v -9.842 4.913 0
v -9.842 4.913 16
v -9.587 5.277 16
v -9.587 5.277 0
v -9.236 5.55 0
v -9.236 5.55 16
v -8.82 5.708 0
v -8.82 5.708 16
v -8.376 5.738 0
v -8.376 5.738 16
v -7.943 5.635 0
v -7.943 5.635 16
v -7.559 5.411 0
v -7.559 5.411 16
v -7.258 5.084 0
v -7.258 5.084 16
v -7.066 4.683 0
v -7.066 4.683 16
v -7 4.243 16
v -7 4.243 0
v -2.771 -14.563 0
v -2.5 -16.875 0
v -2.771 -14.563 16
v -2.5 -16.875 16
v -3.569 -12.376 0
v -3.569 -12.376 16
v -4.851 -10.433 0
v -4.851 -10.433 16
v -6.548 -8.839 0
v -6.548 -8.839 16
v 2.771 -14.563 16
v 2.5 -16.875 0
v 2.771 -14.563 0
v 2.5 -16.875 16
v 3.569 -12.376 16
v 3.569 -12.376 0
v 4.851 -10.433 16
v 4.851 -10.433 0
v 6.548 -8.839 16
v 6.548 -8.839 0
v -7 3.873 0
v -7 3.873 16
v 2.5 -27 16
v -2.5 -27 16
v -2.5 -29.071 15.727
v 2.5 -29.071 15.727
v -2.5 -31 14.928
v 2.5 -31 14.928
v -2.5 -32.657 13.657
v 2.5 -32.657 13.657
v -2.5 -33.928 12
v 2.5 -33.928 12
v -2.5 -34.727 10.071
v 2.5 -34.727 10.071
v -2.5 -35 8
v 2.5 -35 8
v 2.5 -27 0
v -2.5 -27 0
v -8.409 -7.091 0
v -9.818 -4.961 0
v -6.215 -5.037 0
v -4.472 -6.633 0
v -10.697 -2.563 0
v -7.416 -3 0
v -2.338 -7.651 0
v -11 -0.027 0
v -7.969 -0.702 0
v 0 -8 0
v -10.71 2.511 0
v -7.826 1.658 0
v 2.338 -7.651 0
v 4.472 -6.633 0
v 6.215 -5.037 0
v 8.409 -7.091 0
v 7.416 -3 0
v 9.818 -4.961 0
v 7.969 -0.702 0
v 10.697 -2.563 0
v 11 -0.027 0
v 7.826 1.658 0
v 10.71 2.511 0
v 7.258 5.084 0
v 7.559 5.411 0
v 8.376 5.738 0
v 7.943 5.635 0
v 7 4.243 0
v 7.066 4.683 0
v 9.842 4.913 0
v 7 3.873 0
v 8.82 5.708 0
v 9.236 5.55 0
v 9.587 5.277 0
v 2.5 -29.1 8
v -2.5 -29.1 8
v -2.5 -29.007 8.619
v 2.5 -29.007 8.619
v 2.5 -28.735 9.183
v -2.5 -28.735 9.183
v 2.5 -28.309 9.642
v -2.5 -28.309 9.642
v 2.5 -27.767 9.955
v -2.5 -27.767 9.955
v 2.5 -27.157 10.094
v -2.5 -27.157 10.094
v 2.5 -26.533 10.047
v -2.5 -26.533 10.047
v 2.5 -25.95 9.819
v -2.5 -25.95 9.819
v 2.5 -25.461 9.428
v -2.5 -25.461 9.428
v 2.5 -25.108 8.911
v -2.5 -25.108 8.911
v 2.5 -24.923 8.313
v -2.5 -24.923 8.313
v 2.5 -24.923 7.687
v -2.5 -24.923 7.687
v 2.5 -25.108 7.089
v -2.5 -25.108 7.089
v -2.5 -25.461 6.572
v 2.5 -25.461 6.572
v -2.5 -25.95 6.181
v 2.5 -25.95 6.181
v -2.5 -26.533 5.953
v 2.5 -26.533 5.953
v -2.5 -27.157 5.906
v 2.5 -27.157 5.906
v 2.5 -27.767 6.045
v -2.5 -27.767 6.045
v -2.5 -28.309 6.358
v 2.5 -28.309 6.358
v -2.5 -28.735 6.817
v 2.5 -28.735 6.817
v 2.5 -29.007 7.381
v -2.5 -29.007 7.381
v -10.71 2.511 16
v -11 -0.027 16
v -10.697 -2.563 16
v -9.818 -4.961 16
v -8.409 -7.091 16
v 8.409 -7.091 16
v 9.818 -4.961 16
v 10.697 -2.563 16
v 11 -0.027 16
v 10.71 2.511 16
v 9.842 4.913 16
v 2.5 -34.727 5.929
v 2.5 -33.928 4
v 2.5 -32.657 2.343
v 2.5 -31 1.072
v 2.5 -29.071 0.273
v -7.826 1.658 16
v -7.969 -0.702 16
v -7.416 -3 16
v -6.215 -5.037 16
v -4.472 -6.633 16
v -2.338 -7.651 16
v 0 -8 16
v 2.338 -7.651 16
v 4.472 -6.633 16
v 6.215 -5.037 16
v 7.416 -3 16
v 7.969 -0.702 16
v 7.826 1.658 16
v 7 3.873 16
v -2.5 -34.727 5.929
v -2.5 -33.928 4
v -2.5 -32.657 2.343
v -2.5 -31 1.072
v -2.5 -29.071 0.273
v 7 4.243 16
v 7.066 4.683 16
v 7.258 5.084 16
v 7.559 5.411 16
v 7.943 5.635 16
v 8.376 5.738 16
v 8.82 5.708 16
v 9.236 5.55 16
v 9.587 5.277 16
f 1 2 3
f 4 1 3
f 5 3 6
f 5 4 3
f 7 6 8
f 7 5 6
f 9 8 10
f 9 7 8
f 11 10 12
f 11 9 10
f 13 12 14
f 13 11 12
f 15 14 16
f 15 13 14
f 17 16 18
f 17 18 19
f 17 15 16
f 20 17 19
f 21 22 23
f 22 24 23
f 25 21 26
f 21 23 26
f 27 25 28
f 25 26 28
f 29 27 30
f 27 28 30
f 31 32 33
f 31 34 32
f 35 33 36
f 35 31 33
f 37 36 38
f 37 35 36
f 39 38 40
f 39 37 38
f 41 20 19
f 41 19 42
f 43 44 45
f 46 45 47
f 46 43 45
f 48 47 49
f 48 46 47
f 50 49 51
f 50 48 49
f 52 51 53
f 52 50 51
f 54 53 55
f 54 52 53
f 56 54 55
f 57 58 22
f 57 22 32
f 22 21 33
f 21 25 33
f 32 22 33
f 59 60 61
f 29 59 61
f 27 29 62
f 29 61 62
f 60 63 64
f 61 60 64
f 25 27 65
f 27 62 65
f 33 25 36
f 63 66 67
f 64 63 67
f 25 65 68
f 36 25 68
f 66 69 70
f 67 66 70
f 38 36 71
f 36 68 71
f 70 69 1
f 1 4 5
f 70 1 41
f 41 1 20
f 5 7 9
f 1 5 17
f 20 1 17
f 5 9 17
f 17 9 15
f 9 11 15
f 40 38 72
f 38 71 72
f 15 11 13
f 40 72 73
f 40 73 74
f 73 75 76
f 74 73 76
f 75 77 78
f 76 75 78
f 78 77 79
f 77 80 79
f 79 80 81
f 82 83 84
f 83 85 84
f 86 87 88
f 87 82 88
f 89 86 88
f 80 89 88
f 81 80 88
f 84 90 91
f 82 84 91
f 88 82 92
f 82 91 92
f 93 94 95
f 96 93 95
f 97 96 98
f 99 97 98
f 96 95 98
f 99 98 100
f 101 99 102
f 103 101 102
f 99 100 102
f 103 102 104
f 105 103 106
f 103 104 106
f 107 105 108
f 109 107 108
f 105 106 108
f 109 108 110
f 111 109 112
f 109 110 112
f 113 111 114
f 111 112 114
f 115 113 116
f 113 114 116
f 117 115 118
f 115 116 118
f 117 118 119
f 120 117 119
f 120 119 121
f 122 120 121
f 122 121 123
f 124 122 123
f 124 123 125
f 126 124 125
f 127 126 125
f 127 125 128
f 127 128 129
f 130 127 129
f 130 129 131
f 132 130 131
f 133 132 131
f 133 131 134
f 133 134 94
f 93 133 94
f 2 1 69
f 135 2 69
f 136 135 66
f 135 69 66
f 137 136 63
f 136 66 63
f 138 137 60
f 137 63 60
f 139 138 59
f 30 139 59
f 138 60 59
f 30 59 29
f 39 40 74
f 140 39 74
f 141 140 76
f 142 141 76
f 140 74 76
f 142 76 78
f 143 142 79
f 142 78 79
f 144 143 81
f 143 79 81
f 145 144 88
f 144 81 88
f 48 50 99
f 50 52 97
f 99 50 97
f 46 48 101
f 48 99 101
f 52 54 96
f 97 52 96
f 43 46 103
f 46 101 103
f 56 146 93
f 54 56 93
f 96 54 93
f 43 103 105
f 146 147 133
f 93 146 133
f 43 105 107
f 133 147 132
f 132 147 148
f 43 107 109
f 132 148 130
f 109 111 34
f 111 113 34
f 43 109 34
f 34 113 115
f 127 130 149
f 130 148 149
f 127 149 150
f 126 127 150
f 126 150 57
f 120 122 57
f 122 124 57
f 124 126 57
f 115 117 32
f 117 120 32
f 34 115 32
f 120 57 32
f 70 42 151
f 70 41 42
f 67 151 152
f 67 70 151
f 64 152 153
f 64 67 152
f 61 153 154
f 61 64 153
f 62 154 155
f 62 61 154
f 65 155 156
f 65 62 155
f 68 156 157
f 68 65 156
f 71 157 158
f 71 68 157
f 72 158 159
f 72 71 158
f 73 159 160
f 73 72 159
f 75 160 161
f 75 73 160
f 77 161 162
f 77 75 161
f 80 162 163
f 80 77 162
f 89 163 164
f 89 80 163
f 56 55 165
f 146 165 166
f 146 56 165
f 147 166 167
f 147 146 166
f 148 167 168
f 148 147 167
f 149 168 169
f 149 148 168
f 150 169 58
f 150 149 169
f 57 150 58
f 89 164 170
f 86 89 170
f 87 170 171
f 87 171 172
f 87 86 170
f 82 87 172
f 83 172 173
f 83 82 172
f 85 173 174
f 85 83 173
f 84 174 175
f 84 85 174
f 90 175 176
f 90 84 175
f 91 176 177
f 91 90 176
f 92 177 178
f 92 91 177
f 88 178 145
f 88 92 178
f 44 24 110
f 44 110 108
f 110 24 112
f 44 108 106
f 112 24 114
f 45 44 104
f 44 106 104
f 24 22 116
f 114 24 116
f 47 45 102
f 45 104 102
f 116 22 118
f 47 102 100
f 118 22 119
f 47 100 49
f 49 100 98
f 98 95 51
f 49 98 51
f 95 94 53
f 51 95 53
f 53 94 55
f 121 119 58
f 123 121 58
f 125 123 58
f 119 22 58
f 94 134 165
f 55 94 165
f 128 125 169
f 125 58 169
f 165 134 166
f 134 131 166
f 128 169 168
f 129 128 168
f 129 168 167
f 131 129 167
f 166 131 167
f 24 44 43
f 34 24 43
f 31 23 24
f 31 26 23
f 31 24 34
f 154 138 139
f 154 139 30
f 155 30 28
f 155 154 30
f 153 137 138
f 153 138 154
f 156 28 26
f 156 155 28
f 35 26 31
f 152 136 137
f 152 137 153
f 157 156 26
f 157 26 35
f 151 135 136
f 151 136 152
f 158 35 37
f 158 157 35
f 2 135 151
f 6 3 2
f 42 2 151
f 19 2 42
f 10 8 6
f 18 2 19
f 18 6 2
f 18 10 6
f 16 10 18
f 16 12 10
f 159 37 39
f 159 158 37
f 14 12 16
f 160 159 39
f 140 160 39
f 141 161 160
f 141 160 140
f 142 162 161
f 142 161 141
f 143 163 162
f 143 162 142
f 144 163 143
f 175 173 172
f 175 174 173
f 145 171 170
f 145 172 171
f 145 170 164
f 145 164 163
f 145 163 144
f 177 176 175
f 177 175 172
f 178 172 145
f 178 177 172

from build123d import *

# Parameters (mm, degrees)
F0_R     = 8
F1_DEPTH = 16
F3_DEPTH = 25
F4_R     = 1.5
F5_R     = 7.99999
F6_R     = 10
F7_R     = 2.1
F8_DEPTH = 25


# Not quite as in the source:
# - a fillet or chamfer is up to 0.001 mm smaller than in the source, because OpenCascade refuses the exact size


with BuildPart() as f1:
    # F0 (on Top) → F1 (new body)
    with BuildSketch(Plane.XY):
        with BuildLine():
            Line((2.5, -35), (2.5, -10.7121426428))
            ThreePointArc((2.5, -10.7121426428), (0, 11), (-2.5, -10.7121426428))
            Line((-2.5, -10.7121426428), (-2.5, -35))
            Line((-2.5, -35), (2.5, -35))
        make_face()
        Circle(F0_R, mode=Mode.SUBTRACT)
    extrude(amount=F1_DEPTH)

    # F2 (on face) → F3 (cut)
    with BuildSketch(Plane.XY.offset(16)):
        with BuildLine():
            ThreePointArc((-7, 3.8729833462), (0, 8), (7, 3.8729833462))
            Line((7, 3.8729833462), (7, 8.4852813742))
            ThreePointArc((7, 8.4852813742), (0, 11), (-7, 8.4852813742))
            Line((-7, 8.4852813742), (-7, 3.8729833462))
        make_face()
    extrude(amount=-F3_DEPTH, mode=Mode.SUBTRACT)

    # F4
    f4_edges = [f1.edges().sort_by_distance(p)[0] for p in [
        (-7, 8.485281, 8),
        (7, 8.485281, 8),
    ]]
    fillet(f4_edges, radius=F4_R)

    # F5 (radius 8 in the source; OpenCascade refuses exactly that, so slightly less here)
    f5_edges = [f1.edges().sort_by_distance(p)[0] for p in [
        (0, -35, 16),
        (0, -35, 0),
    ]]
    fillet(f5_edges, radius=F5_R)

    # F6
    f6_edges = [f1.edges().sort_by_distance(p)[0] for p in [
        (-2.5, -10.712143, 8),
        (2.5, -10.712143, 8),
    ]]
    fillet(f6_edges, radius=F6_R)

    # F7 (on face) → F8 (cut)
    with BuildSketch(Plane(origin=(-2.5, 0, 0), x_dir=(0, -1, 0), z_dir=(-1, 0, 0))):
        with Locations((27, 8)):
            Circle(F7_R)
    extrude(amount=-F8_DEPTH, mode=Mode.SUBTRACT)


solid = f1.part
